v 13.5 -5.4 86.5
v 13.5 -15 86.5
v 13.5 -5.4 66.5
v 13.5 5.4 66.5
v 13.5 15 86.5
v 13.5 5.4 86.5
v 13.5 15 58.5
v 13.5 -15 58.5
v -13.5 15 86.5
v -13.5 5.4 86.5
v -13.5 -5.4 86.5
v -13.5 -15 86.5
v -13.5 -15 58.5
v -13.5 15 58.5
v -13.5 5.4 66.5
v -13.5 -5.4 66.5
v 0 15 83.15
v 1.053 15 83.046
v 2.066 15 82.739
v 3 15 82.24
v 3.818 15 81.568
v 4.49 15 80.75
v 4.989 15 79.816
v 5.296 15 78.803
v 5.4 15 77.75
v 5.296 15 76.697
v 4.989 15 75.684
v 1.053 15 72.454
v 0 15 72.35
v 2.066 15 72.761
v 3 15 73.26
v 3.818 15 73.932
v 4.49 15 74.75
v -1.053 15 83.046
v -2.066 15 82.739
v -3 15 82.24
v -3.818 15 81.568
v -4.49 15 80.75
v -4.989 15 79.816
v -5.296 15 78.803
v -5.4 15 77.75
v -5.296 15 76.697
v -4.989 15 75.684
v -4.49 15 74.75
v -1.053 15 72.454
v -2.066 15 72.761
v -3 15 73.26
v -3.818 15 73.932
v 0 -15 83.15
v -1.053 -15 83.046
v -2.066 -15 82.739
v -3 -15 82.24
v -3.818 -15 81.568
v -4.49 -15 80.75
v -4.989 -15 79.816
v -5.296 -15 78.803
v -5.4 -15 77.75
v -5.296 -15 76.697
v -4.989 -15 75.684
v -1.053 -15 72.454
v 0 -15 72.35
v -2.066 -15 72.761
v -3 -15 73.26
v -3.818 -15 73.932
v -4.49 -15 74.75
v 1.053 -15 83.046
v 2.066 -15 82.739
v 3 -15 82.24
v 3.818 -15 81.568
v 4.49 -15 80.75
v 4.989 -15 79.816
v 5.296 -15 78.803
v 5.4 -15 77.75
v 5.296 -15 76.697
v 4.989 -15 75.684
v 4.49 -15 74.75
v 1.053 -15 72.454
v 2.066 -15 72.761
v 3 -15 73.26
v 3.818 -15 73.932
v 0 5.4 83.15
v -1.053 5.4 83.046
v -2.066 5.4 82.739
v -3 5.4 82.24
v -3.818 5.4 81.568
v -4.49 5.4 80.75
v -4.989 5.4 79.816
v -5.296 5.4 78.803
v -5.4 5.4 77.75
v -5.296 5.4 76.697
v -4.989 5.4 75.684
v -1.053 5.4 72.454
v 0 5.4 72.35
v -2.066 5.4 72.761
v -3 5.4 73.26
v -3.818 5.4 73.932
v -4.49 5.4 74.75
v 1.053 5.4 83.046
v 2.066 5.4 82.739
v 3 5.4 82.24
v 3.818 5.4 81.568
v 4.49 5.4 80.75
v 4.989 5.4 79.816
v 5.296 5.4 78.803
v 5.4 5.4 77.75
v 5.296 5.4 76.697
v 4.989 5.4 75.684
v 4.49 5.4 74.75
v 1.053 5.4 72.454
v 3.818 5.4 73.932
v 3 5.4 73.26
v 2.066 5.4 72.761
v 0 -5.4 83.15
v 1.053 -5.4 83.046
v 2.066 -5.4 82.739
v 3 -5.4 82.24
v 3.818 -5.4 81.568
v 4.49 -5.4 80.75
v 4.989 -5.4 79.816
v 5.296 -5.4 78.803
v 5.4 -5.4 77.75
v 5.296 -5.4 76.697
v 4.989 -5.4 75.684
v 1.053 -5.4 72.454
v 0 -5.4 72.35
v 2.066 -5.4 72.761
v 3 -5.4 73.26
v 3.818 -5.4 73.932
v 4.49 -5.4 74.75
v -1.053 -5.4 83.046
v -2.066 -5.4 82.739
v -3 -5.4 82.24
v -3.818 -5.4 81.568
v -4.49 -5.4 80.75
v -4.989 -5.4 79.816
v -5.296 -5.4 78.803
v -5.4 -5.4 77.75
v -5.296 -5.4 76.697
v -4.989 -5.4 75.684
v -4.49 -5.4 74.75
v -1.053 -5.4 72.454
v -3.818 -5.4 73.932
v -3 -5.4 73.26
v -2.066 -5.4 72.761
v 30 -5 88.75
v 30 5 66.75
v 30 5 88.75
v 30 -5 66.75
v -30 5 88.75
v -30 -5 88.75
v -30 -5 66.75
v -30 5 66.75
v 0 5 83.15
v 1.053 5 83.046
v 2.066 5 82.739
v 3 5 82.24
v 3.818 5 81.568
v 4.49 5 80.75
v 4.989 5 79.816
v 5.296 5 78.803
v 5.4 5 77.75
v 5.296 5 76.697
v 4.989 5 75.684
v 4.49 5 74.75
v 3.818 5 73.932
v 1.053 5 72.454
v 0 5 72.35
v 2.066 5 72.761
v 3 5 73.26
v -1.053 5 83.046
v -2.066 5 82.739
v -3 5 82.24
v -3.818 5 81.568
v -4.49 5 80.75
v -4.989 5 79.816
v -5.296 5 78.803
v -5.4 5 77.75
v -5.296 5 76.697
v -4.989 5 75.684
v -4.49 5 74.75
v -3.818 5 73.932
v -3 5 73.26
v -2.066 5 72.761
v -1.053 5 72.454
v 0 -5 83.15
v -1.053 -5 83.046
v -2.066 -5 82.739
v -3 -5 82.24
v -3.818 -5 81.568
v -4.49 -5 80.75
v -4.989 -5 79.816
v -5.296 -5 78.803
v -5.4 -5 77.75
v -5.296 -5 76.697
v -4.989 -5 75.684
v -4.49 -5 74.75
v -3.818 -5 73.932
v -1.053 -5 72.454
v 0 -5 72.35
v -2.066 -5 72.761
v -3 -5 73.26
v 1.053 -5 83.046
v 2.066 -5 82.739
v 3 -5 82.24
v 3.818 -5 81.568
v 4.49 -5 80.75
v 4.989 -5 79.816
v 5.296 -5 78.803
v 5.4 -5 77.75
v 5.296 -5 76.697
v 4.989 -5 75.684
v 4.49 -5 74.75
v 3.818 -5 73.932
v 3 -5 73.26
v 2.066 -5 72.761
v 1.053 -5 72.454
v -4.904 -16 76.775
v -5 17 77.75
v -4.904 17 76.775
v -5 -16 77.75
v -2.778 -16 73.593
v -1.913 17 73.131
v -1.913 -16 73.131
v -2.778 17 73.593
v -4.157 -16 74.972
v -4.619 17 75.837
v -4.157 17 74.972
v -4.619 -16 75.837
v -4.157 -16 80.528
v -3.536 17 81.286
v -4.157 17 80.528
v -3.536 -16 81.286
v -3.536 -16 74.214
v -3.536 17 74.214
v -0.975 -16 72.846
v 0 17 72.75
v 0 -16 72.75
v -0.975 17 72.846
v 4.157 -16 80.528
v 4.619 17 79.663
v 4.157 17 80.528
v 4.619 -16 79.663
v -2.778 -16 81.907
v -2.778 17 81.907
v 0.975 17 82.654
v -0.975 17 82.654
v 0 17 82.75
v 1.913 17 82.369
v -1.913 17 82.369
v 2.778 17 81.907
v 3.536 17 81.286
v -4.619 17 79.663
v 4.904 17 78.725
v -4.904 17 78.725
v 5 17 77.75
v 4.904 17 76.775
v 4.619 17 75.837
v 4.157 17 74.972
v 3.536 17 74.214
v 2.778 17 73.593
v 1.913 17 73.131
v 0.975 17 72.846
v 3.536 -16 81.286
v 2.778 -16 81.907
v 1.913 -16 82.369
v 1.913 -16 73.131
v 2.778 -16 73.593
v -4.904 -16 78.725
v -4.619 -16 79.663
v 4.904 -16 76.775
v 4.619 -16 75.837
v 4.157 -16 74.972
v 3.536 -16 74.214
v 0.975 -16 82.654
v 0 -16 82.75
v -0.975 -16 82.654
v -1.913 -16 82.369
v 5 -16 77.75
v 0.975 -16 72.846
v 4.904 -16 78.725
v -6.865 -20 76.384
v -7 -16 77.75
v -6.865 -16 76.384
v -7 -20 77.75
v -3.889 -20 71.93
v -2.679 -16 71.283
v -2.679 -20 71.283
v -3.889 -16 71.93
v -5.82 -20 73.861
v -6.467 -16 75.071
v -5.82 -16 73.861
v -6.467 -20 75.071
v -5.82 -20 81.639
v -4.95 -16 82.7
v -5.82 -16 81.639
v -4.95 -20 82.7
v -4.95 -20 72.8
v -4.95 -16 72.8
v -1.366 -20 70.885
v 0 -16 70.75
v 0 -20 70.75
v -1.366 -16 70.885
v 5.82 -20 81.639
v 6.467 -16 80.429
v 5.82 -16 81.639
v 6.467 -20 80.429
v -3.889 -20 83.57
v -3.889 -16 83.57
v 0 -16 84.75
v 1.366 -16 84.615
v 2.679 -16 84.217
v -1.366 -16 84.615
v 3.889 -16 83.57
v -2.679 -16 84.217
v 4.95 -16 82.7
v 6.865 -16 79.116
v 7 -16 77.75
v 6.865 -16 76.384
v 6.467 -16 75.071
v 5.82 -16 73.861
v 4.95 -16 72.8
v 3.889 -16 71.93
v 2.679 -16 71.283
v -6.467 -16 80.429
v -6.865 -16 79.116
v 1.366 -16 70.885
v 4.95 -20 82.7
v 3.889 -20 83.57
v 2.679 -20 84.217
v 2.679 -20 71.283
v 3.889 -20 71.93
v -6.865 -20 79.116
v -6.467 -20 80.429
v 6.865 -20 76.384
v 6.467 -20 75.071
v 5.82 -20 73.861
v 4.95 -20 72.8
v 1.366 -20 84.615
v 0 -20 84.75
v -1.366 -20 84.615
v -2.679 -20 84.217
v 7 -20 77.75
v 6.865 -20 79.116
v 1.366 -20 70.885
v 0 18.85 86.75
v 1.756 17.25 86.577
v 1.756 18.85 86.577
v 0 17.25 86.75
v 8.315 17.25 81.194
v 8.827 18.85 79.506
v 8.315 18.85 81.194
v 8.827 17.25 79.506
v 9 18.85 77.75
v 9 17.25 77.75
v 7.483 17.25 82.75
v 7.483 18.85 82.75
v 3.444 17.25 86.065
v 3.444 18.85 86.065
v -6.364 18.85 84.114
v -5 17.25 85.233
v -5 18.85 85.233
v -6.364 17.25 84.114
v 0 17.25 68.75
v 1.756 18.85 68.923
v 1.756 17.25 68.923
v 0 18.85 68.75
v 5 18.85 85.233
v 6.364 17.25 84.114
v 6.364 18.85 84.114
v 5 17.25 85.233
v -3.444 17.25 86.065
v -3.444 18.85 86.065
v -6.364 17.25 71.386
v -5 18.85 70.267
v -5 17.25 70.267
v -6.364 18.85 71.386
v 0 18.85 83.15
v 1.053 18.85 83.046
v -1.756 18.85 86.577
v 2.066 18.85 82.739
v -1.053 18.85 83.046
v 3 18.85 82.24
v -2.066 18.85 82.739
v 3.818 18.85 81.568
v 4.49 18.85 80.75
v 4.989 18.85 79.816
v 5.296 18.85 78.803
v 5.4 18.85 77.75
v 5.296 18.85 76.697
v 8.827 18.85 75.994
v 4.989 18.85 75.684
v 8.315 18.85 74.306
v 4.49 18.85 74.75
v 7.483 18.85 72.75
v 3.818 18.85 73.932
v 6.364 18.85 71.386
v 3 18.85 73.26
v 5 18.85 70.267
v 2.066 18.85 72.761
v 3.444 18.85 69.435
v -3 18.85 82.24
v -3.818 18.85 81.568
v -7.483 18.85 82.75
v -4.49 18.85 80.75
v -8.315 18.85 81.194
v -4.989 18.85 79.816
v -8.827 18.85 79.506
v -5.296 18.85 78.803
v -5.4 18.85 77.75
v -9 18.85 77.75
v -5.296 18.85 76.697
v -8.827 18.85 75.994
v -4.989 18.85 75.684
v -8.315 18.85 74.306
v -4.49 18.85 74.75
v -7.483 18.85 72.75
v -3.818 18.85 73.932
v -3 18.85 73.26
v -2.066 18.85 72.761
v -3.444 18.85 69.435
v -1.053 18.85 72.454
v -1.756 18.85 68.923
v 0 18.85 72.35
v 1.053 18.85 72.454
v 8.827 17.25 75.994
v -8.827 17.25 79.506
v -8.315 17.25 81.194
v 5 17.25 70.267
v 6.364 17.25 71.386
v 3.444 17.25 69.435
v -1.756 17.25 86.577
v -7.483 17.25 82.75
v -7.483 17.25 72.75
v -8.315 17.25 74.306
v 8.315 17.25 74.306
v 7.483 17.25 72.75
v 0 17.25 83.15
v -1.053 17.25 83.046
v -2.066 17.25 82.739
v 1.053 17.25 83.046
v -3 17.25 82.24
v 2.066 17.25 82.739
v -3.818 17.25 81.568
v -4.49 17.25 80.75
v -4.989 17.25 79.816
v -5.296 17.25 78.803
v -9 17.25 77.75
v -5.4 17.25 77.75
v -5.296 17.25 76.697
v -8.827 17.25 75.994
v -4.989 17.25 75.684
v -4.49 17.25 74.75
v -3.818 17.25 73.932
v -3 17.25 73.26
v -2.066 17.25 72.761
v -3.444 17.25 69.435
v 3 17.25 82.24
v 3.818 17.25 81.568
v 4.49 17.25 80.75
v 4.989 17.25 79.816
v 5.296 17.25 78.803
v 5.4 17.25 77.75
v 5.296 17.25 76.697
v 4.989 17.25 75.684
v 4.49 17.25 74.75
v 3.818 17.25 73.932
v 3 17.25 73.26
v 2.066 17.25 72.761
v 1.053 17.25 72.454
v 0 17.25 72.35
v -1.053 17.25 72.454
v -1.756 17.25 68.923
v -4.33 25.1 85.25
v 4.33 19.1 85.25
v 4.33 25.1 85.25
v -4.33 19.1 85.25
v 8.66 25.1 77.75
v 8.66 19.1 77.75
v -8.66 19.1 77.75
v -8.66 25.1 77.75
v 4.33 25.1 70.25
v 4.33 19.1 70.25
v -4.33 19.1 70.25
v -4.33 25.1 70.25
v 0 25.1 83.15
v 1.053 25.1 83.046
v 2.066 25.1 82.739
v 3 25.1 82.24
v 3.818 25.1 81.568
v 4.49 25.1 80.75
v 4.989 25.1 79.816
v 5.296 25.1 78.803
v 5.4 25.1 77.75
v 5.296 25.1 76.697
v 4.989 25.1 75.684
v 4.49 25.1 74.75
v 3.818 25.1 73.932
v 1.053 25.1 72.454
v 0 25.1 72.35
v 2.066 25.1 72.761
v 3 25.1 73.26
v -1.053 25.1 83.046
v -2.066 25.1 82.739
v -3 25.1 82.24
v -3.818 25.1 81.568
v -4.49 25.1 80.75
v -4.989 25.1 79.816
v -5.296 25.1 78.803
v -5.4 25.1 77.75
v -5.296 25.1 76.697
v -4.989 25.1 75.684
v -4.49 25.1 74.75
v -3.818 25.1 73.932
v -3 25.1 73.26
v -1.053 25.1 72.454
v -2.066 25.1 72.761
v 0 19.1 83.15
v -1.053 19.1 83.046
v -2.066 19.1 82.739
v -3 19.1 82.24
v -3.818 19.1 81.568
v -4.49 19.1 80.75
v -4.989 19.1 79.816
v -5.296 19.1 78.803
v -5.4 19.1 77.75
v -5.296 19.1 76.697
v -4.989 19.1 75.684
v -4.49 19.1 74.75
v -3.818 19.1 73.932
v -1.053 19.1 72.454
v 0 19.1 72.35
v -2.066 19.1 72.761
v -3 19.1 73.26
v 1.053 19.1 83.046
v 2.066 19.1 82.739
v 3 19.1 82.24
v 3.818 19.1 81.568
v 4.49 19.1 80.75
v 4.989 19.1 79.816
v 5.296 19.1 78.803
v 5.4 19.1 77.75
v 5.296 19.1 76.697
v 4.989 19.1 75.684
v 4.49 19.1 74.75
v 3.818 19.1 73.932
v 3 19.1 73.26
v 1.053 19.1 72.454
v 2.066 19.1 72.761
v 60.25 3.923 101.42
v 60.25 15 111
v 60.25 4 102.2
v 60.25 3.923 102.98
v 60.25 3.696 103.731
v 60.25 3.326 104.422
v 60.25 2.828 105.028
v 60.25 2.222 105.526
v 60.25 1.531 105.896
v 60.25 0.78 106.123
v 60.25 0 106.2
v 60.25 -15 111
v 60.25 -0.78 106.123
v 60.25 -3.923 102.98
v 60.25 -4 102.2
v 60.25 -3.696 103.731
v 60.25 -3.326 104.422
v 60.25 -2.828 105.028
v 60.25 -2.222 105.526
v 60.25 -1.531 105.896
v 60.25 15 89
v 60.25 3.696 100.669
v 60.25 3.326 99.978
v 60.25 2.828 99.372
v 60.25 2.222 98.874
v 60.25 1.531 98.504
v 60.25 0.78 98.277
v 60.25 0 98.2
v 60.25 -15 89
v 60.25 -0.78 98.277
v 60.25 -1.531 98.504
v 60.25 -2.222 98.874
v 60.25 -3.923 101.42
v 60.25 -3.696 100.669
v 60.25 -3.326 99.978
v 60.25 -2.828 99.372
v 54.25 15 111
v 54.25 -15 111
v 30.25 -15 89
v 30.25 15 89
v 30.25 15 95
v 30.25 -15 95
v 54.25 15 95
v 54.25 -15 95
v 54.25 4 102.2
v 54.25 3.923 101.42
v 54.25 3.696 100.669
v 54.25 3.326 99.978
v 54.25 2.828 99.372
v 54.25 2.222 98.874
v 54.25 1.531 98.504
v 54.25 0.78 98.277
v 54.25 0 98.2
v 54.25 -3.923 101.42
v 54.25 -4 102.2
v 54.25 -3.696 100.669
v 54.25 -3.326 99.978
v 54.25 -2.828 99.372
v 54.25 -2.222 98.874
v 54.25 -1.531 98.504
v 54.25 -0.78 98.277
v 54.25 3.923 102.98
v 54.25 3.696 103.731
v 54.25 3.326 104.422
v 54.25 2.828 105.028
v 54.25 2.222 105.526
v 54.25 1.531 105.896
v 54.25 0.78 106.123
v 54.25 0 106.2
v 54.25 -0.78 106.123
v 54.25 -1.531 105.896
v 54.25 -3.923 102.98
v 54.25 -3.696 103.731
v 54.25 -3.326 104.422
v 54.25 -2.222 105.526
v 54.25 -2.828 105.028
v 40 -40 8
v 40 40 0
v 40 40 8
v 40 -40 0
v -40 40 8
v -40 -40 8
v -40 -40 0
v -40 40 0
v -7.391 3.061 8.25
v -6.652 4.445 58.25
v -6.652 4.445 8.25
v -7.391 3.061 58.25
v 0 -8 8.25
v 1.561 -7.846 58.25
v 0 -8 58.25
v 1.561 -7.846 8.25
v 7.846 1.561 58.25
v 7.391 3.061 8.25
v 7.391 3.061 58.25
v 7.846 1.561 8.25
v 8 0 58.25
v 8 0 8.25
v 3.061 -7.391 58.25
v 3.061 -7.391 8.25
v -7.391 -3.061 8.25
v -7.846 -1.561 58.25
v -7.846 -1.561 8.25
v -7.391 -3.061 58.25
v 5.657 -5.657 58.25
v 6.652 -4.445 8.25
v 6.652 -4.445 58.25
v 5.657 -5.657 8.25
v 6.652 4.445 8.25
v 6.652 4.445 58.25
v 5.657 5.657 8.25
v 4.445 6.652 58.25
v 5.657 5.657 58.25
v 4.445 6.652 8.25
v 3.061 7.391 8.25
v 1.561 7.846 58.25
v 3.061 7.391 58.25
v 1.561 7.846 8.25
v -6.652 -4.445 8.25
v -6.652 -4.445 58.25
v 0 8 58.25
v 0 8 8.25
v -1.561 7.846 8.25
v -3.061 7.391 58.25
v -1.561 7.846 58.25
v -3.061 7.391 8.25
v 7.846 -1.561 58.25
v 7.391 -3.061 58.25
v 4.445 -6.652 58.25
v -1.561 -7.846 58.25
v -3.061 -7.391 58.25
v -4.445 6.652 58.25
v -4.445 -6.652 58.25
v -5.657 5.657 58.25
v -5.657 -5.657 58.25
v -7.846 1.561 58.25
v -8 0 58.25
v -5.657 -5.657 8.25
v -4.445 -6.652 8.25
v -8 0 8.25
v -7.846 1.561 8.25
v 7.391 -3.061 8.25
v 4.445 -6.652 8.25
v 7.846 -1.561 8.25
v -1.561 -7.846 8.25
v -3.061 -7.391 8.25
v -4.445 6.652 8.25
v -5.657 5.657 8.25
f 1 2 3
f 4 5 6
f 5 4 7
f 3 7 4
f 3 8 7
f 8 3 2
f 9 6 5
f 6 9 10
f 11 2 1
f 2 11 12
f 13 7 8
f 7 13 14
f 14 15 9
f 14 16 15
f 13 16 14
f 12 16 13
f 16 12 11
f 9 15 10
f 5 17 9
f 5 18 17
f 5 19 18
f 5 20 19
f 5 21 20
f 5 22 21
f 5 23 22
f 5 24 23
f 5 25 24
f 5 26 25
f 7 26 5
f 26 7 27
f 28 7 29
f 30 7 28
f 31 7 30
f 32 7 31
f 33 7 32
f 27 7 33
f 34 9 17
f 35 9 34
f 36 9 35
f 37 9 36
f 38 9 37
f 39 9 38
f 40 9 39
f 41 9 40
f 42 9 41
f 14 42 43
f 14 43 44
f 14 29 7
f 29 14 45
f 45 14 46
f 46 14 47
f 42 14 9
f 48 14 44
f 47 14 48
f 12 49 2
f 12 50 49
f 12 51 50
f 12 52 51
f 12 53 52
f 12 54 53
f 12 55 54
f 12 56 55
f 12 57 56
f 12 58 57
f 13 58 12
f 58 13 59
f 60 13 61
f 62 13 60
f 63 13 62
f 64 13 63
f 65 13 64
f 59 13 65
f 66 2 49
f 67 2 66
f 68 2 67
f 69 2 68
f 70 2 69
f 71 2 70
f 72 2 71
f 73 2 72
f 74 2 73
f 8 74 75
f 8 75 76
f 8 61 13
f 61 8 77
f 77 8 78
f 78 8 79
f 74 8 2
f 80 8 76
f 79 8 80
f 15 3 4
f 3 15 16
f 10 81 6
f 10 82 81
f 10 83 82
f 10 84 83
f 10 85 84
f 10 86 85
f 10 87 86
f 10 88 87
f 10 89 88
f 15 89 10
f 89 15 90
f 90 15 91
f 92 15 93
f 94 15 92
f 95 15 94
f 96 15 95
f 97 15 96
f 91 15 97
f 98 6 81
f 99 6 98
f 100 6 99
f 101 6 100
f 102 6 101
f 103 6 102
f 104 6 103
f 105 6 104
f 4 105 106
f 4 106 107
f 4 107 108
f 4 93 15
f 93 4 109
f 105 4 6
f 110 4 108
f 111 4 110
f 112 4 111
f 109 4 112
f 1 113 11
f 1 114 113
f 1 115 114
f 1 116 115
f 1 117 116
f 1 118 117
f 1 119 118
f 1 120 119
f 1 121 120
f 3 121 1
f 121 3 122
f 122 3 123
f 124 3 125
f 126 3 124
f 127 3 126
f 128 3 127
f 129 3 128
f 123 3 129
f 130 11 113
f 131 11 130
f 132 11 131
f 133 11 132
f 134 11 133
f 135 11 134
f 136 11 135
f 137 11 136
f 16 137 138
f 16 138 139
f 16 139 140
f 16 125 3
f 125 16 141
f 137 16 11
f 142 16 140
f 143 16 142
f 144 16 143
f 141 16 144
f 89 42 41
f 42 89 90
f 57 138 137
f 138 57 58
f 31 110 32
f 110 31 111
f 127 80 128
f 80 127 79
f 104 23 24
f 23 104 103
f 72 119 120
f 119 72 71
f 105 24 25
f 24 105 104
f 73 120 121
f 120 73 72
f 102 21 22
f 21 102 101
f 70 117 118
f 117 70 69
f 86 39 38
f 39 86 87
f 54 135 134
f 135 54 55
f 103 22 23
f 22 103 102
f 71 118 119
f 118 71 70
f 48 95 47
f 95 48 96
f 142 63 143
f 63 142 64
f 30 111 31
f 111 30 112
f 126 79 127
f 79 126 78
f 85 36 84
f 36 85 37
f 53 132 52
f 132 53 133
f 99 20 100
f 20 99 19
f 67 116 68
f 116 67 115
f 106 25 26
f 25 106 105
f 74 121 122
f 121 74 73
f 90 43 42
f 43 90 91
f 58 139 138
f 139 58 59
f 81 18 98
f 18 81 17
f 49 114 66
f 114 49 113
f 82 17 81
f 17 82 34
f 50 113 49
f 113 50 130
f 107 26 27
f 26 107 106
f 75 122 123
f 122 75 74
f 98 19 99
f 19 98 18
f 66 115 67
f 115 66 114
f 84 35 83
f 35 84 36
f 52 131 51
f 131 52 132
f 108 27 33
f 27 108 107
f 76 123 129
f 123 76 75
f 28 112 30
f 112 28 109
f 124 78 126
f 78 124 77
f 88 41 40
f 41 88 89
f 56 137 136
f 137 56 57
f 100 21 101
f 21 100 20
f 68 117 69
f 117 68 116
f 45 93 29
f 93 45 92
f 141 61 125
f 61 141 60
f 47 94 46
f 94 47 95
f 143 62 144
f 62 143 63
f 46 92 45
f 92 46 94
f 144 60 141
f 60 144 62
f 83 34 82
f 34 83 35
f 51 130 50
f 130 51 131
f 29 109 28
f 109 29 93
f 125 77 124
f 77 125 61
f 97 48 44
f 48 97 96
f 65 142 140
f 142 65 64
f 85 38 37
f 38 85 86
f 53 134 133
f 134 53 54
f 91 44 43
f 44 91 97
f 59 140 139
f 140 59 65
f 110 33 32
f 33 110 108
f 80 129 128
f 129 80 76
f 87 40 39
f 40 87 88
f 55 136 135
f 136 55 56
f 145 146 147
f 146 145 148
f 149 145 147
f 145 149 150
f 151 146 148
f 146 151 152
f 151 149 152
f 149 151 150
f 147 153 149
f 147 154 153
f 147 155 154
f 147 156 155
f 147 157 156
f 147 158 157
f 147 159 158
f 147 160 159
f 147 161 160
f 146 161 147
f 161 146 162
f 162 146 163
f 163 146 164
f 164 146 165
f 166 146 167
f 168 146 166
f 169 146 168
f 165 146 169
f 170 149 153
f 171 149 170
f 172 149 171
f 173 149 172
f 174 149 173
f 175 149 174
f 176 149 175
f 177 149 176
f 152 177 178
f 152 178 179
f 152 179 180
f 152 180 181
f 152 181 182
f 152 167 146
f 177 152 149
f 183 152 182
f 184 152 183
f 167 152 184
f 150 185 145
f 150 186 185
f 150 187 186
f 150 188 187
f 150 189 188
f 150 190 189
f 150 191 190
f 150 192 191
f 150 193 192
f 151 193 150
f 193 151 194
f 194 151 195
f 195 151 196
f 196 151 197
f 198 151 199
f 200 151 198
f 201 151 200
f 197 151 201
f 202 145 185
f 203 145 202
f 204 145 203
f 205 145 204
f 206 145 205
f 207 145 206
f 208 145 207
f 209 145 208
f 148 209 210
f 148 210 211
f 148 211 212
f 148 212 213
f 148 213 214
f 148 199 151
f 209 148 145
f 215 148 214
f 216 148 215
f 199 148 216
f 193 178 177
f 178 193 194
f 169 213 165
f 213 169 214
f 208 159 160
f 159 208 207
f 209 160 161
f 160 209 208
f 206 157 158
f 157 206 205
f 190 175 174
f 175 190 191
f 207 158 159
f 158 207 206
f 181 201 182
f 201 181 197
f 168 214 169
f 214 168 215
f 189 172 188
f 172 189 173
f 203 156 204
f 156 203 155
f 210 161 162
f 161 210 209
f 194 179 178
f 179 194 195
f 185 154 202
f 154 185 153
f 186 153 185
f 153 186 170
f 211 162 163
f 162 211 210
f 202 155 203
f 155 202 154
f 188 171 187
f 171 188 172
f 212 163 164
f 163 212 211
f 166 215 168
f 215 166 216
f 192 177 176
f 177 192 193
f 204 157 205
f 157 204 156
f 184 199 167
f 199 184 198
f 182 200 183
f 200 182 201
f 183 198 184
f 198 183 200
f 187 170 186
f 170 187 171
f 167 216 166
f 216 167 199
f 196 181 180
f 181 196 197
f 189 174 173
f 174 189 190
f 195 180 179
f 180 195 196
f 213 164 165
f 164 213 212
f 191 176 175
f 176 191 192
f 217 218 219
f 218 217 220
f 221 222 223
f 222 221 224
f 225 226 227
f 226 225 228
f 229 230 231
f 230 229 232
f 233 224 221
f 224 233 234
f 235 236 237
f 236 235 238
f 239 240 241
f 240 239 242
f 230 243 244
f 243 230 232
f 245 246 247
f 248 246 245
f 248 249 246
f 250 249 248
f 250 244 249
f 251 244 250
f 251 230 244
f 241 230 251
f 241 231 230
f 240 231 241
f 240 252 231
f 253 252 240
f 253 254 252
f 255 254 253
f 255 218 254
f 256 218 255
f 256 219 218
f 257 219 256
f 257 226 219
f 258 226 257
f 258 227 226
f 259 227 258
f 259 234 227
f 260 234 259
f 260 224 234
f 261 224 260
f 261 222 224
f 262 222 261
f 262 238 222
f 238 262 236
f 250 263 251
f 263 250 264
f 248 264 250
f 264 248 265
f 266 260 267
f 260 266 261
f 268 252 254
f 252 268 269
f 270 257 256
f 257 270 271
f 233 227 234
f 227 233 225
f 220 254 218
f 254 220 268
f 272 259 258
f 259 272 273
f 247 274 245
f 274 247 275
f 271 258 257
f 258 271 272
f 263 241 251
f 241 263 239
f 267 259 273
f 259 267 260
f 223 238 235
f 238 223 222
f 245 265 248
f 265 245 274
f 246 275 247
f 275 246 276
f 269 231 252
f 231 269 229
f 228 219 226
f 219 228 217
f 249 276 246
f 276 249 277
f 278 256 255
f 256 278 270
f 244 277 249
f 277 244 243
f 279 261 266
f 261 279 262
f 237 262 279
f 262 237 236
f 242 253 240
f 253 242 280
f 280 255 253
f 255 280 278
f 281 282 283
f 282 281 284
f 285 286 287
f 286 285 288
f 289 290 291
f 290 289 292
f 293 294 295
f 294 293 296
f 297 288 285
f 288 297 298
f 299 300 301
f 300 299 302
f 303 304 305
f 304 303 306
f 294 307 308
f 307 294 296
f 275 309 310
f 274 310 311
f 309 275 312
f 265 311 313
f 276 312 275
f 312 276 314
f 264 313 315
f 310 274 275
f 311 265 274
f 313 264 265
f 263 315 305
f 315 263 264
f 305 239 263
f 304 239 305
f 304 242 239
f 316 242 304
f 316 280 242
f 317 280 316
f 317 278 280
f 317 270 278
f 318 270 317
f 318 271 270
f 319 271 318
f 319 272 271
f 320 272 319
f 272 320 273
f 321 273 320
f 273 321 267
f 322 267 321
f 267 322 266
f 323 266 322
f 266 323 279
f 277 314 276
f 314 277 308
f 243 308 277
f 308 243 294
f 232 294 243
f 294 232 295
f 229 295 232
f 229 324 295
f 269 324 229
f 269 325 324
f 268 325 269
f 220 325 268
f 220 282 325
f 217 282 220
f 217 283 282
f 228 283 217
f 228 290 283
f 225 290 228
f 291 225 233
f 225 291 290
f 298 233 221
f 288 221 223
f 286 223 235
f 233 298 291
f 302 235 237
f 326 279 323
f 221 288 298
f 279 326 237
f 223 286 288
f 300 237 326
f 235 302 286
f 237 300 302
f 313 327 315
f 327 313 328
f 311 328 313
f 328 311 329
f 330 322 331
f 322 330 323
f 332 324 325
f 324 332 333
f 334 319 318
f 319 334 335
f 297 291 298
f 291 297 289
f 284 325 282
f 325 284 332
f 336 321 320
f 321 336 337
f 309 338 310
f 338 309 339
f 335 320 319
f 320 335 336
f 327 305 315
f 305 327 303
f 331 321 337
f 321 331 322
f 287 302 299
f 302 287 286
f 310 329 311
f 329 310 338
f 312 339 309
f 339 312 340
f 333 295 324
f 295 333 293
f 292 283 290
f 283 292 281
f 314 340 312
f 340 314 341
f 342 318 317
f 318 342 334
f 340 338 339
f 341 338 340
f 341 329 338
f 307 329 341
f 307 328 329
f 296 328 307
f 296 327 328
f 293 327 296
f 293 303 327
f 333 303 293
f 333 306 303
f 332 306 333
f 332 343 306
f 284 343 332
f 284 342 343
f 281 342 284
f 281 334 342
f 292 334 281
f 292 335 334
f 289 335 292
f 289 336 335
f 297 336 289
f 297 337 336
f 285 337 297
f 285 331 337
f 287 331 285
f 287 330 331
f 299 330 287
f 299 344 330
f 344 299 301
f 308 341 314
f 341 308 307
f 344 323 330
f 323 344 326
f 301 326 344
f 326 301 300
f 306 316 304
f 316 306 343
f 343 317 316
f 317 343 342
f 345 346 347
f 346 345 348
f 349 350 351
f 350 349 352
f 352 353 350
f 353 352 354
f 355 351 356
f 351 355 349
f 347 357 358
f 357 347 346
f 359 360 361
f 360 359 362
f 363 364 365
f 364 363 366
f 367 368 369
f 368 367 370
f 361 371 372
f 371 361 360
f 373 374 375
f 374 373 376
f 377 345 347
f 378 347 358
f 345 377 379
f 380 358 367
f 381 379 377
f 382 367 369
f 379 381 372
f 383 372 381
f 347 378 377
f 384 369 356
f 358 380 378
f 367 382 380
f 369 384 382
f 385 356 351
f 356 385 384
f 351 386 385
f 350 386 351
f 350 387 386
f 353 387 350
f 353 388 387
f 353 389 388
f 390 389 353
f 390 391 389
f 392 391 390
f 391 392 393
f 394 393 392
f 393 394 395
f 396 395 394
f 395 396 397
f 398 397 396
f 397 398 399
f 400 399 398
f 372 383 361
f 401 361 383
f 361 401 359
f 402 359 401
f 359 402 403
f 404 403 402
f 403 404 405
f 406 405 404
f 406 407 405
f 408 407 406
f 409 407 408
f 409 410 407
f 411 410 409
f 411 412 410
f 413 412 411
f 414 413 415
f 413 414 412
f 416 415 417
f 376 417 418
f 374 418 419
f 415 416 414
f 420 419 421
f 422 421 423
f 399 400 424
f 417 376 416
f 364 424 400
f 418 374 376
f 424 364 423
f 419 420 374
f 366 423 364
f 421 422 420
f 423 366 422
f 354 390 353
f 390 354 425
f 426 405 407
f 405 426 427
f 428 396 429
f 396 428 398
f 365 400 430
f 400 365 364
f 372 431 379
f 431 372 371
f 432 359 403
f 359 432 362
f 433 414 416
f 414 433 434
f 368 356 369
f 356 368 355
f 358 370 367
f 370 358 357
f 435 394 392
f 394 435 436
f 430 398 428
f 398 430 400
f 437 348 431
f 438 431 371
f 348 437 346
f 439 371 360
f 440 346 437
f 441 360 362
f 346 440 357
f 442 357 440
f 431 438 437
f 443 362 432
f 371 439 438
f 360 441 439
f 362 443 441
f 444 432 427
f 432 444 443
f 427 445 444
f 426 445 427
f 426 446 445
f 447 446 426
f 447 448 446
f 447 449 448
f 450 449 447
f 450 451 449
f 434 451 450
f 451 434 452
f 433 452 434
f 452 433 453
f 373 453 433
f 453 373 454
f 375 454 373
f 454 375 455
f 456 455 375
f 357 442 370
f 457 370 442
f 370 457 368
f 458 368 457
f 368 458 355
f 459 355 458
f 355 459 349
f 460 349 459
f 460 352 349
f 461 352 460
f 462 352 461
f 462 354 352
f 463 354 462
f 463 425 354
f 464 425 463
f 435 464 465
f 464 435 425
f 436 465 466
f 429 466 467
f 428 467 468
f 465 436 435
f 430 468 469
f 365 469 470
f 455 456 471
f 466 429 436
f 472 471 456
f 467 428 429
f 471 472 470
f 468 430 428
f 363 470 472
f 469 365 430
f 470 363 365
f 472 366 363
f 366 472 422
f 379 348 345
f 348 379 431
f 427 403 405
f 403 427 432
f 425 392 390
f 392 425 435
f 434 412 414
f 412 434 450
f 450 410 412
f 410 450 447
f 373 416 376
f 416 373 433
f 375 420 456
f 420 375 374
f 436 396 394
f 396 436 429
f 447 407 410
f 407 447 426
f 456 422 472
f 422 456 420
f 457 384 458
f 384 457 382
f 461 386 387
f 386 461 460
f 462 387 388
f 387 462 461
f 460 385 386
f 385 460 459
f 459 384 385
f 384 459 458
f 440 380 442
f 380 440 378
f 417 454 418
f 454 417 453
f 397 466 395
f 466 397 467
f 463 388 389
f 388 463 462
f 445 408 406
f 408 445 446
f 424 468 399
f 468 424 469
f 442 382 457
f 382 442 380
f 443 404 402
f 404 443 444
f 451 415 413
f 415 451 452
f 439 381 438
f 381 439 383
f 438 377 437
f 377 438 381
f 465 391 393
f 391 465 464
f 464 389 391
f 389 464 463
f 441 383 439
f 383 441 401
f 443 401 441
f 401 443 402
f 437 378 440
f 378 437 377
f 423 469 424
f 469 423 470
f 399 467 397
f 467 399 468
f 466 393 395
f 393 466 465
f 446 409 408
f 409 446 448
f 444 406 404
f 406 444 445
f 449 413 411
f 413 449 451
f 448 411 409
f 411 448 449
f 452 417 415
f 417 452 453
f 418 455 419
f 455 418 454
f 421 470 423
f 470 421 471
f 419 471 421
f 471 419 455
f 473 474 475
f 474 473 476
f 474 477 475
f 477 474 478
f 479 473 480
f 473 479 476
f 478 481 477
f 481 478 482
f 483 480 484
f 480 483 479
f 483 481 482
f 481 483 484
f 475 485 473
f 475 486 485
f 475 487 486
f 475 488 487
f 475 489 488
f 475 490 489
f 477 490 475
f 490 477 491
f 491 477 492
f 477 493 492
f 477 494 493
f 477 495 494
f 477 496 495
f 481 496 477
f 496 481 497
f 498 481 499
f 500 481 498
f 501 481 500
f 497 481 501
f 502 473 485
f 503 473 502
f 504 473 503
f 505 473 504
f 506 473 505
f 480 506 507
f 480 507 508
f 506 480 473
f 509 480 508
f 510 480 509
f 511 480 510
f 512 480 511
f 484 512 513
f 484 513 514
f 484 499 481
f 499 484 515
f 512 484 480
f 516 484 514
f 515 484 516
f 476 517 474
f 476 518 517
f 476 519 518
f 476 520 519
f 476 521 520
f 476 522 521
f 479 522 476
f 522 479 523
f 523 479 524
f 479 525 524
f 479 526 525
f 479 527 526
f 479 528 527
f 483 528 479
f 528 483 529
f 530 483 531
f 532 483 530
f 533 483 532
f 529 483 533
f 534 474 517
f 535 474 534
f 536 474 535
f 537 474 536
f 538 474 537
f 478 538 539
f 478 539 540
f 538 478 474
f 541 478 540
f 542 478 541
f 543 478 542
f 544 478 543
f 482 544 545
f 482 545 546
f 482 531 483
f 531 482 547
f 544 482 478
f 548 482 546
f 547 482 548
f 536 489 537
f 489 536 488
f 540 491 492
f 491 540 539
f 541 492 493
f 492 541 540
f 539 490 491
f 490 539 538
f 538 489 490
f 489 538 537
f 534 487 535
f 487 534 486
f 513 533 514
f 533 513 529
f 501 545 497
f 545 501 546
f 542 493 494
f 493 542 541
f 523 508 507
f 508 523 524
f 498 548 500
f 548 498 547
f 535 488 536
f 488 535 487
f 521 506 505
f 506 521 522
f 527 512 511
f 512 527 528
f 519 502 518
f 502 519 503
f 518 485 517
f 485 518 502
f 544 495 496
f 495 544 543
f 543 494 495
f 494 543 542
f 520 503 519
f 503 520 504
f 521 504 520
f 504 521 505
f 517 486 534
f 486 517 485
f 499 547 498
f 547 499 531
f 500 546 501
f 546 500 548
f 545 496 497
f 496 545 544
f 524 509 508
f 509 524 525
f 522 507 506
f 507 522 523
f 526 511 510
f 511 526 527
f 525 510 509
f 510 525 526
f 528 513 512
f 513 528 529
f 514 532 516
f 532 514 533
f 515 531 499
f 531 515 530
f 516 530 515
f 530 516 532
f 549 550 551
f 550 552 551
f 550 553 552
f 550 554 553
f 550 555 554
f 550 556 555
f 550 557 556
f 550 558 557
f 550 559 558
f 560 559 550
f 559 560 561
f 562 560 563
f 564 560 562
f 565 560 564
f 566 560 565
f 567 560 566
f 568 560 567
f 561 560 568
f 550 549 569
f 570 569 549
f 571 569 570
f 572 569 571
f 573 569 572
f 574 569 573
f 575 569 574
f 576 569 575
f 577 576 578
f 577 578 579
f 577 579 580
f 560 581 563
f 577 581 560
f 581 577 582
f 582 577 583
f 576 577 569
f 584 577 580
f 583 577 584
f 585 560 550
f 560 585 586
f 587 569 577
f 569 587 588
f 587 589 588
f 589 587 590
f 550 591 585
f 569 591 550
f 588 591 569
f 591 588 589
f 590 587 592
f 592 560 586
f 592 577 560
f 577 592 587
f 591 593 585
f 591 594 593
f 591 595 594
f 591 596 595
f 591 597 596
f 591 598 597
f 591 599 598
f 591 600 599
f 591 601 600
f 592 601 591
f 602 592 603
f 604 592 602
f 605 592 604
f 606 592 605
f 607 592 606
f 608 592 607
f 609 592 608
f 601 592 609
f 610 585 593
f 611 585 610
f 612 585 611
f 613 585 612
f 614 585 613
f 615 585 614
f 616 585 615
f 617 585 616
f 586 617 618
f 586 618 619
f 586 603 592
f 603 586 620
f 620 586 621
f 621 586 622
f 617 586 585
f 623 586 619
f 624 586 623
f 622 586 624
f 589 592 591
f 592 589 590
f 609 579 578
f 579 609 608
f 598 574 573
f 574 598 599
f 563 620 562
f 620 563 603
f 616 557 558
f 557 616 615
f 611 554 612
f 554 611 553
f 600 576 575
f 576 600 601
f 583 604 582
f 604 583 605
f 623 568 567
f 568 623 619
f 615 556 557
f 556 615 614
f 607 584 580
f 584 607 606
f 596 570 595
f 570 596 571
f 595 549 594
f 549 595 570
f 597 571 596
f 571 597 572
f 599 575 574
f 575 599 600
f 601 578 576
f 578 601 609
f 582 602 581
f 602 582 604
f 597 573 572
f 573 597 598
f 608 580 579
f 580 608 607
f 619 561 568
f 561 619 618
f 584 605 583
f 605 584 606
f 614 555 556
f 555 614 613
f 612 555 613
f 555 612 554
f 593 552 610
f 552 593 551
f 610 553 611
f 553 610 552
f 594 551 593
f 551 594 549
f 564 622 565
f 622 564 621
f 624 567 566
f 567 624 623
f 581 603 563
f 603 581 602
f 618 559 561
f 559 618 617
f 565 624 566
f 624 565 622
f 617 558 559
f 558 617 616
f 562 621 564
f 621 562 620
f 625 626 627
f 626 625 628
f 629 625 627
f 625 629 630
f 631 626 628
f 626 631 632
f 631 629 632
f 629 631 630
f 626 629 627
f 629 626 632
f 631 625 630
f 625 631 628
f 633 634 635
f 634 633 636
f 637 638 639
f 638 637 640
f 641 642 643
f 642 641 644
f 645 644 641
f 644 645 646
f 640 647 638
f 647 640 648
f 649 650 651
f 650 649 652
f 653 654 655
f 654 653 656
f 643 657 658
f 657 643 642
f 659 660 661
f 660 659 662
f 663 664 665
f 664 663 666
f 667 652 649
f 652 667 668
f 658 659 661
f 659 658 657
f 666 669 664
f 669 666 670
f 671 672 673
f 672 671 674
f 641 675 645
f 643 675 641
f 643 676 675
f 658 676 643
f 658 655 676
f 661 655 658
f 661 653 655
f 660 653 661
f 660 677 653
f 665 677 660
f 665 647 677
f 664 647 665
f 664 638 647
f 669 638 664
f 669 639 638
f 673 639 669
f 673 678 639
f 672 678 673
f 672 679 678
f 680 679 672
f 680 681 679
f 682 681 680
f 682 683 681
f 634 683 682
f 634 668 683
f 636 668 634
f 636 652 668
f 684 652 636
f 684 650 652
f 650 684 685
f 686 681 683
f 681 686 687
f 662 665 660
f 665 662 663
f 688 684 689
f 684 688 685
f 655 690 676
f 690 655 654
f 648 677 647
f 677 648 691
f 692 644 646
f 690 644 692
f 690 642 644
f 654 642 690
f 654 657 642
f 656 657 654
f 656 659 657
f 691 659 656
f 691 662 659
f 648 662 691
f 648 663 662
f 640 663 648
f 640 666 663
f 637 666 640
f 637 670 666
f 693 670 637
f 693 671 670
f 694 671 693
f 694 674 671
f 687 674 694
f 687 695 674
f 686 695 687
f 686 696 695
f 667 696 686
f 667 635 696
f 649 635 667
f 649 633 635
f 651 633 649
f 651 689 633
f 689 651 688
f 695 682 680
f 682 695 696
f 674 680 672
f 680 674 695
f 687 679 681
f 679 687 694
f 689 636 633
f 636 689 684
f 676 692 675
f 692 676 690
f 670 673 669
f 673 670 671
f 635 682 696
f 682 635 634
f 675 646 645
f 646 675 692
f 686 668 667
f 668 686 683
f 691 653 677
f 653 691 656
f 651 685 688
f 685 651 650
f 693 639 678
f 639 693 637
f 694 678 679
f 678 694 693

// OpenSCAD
$fn = 32;

// ------------------------------------------------------------------------
// Lamp arm: column d16 x 50 mm, arm 60 mm
// Every part is its own module, assembly() places every instance.
// ------------------------------------------------------------------------

// --- part 1 ---
module lamp_base() {
  difference() {
    translate([-40, -40, 0]) cube([80, 80, 8]);
  }
}

// --- part 2 ---
module lamp_column() {
  cylinder(h = 50, d = 16);
}

// --- part 3 ---
module head_fork() {
  difference() {
    translate([-13.5, -15, 0]) cube([27, 30, 28]);
    translate([-14.5, -5.4, 8]) cube([29, 10.8, 21]);
    translate([0, 0, 19.25]) rotate([90, 0, 0]) cylinder(h = 32, d = 10.8, center = true);
  }
}

// --- part 4 ---
module lamp_arm() {
  difference() {
    translate([-30, -5, 0]) cube([60, 10, 22]);
    translate([0, 0, 11]) rotate([90, 0, 0]) cylinder(h = 12, d = 10.8, center = true);
  }
}

// --- part 5 ---
module arm_pin() {
  rotate([0, 90, 0]) cylinder(h = 34, d = 10, center = true);
  translate([-20, 0, 0]) rotate([0, 90, 0]) cylinder(h = 4, d = 14);
}

// --- part 6 ---
module arm_washer() {
  difference() {
      translate([0, 0, 0]) cylinder(h = 1.6, d = 18);
      translate([0, 0, -1]) cylinder(h = 3.6, d = 10.8);
    }
}

// --- part 7 ---
module arm_nut() {
  difference() {
    linear_extrude(height = 6) polygon(points = [[8.66, 0], [4.33, 7.5], [-4.33, 7.5], [-8.66, 0], [-4.33, -7.5], [4.33, -7.5]]);
    translate([0, 0, -1]) cylinder(h = 8, d = 10.8);
  }
}

// --- part 8 ---
module shade_bracket() {
  difference() {
    translate([-15, -15, 0]) cube([30, 30, 22]);
    translate([-16, -16, 6]) cube([25, 32, 17]);
    translate([12, 0, 13.2]) rotate([0, 90, 0]) cylinder(h = 8, d = 8, center = true);
  }
}

// --- assembly ---
module assembly() {
  color([0.80, 0.24, 0.20]) translate([0, 0, 0]) rotate([0, 0, 0]) lamp_base();
  color([0.20, 0.45, 0.75]) translate([0, 0, 8.25]) rotate([0, 0, 0]) lamp_column();
  color([0.25, 0.62, 0.32]) translate([0, 0, 58.5]) rotate([0, 0, 0]) head_fork();
  color([0.92, 0.70, 0.18]) translate([0, 0, 66.75]) rotate([0, 0, 0]) lamp_arm();
  color([0.58, 0.35, 0.70]) translate([0, 0, 77.75]) rotate([0, 0, 90]) arm_pin();
  color([0.16, 0.66, 0.66]) translate([0, 18.85, 77.75]) rotate([90, 0, 0]) arm_washer();
  color([0.85, 0.48, 0.18]) translate([0, 25.1, 77.75]) rotate([90, 0, 0]) arm_nut();
  color([0.55, 0.60, 0.65]) translate([45.25, 0, 89]) rotate([0, 0, 0]) shade_bracket();
}

assembly();
